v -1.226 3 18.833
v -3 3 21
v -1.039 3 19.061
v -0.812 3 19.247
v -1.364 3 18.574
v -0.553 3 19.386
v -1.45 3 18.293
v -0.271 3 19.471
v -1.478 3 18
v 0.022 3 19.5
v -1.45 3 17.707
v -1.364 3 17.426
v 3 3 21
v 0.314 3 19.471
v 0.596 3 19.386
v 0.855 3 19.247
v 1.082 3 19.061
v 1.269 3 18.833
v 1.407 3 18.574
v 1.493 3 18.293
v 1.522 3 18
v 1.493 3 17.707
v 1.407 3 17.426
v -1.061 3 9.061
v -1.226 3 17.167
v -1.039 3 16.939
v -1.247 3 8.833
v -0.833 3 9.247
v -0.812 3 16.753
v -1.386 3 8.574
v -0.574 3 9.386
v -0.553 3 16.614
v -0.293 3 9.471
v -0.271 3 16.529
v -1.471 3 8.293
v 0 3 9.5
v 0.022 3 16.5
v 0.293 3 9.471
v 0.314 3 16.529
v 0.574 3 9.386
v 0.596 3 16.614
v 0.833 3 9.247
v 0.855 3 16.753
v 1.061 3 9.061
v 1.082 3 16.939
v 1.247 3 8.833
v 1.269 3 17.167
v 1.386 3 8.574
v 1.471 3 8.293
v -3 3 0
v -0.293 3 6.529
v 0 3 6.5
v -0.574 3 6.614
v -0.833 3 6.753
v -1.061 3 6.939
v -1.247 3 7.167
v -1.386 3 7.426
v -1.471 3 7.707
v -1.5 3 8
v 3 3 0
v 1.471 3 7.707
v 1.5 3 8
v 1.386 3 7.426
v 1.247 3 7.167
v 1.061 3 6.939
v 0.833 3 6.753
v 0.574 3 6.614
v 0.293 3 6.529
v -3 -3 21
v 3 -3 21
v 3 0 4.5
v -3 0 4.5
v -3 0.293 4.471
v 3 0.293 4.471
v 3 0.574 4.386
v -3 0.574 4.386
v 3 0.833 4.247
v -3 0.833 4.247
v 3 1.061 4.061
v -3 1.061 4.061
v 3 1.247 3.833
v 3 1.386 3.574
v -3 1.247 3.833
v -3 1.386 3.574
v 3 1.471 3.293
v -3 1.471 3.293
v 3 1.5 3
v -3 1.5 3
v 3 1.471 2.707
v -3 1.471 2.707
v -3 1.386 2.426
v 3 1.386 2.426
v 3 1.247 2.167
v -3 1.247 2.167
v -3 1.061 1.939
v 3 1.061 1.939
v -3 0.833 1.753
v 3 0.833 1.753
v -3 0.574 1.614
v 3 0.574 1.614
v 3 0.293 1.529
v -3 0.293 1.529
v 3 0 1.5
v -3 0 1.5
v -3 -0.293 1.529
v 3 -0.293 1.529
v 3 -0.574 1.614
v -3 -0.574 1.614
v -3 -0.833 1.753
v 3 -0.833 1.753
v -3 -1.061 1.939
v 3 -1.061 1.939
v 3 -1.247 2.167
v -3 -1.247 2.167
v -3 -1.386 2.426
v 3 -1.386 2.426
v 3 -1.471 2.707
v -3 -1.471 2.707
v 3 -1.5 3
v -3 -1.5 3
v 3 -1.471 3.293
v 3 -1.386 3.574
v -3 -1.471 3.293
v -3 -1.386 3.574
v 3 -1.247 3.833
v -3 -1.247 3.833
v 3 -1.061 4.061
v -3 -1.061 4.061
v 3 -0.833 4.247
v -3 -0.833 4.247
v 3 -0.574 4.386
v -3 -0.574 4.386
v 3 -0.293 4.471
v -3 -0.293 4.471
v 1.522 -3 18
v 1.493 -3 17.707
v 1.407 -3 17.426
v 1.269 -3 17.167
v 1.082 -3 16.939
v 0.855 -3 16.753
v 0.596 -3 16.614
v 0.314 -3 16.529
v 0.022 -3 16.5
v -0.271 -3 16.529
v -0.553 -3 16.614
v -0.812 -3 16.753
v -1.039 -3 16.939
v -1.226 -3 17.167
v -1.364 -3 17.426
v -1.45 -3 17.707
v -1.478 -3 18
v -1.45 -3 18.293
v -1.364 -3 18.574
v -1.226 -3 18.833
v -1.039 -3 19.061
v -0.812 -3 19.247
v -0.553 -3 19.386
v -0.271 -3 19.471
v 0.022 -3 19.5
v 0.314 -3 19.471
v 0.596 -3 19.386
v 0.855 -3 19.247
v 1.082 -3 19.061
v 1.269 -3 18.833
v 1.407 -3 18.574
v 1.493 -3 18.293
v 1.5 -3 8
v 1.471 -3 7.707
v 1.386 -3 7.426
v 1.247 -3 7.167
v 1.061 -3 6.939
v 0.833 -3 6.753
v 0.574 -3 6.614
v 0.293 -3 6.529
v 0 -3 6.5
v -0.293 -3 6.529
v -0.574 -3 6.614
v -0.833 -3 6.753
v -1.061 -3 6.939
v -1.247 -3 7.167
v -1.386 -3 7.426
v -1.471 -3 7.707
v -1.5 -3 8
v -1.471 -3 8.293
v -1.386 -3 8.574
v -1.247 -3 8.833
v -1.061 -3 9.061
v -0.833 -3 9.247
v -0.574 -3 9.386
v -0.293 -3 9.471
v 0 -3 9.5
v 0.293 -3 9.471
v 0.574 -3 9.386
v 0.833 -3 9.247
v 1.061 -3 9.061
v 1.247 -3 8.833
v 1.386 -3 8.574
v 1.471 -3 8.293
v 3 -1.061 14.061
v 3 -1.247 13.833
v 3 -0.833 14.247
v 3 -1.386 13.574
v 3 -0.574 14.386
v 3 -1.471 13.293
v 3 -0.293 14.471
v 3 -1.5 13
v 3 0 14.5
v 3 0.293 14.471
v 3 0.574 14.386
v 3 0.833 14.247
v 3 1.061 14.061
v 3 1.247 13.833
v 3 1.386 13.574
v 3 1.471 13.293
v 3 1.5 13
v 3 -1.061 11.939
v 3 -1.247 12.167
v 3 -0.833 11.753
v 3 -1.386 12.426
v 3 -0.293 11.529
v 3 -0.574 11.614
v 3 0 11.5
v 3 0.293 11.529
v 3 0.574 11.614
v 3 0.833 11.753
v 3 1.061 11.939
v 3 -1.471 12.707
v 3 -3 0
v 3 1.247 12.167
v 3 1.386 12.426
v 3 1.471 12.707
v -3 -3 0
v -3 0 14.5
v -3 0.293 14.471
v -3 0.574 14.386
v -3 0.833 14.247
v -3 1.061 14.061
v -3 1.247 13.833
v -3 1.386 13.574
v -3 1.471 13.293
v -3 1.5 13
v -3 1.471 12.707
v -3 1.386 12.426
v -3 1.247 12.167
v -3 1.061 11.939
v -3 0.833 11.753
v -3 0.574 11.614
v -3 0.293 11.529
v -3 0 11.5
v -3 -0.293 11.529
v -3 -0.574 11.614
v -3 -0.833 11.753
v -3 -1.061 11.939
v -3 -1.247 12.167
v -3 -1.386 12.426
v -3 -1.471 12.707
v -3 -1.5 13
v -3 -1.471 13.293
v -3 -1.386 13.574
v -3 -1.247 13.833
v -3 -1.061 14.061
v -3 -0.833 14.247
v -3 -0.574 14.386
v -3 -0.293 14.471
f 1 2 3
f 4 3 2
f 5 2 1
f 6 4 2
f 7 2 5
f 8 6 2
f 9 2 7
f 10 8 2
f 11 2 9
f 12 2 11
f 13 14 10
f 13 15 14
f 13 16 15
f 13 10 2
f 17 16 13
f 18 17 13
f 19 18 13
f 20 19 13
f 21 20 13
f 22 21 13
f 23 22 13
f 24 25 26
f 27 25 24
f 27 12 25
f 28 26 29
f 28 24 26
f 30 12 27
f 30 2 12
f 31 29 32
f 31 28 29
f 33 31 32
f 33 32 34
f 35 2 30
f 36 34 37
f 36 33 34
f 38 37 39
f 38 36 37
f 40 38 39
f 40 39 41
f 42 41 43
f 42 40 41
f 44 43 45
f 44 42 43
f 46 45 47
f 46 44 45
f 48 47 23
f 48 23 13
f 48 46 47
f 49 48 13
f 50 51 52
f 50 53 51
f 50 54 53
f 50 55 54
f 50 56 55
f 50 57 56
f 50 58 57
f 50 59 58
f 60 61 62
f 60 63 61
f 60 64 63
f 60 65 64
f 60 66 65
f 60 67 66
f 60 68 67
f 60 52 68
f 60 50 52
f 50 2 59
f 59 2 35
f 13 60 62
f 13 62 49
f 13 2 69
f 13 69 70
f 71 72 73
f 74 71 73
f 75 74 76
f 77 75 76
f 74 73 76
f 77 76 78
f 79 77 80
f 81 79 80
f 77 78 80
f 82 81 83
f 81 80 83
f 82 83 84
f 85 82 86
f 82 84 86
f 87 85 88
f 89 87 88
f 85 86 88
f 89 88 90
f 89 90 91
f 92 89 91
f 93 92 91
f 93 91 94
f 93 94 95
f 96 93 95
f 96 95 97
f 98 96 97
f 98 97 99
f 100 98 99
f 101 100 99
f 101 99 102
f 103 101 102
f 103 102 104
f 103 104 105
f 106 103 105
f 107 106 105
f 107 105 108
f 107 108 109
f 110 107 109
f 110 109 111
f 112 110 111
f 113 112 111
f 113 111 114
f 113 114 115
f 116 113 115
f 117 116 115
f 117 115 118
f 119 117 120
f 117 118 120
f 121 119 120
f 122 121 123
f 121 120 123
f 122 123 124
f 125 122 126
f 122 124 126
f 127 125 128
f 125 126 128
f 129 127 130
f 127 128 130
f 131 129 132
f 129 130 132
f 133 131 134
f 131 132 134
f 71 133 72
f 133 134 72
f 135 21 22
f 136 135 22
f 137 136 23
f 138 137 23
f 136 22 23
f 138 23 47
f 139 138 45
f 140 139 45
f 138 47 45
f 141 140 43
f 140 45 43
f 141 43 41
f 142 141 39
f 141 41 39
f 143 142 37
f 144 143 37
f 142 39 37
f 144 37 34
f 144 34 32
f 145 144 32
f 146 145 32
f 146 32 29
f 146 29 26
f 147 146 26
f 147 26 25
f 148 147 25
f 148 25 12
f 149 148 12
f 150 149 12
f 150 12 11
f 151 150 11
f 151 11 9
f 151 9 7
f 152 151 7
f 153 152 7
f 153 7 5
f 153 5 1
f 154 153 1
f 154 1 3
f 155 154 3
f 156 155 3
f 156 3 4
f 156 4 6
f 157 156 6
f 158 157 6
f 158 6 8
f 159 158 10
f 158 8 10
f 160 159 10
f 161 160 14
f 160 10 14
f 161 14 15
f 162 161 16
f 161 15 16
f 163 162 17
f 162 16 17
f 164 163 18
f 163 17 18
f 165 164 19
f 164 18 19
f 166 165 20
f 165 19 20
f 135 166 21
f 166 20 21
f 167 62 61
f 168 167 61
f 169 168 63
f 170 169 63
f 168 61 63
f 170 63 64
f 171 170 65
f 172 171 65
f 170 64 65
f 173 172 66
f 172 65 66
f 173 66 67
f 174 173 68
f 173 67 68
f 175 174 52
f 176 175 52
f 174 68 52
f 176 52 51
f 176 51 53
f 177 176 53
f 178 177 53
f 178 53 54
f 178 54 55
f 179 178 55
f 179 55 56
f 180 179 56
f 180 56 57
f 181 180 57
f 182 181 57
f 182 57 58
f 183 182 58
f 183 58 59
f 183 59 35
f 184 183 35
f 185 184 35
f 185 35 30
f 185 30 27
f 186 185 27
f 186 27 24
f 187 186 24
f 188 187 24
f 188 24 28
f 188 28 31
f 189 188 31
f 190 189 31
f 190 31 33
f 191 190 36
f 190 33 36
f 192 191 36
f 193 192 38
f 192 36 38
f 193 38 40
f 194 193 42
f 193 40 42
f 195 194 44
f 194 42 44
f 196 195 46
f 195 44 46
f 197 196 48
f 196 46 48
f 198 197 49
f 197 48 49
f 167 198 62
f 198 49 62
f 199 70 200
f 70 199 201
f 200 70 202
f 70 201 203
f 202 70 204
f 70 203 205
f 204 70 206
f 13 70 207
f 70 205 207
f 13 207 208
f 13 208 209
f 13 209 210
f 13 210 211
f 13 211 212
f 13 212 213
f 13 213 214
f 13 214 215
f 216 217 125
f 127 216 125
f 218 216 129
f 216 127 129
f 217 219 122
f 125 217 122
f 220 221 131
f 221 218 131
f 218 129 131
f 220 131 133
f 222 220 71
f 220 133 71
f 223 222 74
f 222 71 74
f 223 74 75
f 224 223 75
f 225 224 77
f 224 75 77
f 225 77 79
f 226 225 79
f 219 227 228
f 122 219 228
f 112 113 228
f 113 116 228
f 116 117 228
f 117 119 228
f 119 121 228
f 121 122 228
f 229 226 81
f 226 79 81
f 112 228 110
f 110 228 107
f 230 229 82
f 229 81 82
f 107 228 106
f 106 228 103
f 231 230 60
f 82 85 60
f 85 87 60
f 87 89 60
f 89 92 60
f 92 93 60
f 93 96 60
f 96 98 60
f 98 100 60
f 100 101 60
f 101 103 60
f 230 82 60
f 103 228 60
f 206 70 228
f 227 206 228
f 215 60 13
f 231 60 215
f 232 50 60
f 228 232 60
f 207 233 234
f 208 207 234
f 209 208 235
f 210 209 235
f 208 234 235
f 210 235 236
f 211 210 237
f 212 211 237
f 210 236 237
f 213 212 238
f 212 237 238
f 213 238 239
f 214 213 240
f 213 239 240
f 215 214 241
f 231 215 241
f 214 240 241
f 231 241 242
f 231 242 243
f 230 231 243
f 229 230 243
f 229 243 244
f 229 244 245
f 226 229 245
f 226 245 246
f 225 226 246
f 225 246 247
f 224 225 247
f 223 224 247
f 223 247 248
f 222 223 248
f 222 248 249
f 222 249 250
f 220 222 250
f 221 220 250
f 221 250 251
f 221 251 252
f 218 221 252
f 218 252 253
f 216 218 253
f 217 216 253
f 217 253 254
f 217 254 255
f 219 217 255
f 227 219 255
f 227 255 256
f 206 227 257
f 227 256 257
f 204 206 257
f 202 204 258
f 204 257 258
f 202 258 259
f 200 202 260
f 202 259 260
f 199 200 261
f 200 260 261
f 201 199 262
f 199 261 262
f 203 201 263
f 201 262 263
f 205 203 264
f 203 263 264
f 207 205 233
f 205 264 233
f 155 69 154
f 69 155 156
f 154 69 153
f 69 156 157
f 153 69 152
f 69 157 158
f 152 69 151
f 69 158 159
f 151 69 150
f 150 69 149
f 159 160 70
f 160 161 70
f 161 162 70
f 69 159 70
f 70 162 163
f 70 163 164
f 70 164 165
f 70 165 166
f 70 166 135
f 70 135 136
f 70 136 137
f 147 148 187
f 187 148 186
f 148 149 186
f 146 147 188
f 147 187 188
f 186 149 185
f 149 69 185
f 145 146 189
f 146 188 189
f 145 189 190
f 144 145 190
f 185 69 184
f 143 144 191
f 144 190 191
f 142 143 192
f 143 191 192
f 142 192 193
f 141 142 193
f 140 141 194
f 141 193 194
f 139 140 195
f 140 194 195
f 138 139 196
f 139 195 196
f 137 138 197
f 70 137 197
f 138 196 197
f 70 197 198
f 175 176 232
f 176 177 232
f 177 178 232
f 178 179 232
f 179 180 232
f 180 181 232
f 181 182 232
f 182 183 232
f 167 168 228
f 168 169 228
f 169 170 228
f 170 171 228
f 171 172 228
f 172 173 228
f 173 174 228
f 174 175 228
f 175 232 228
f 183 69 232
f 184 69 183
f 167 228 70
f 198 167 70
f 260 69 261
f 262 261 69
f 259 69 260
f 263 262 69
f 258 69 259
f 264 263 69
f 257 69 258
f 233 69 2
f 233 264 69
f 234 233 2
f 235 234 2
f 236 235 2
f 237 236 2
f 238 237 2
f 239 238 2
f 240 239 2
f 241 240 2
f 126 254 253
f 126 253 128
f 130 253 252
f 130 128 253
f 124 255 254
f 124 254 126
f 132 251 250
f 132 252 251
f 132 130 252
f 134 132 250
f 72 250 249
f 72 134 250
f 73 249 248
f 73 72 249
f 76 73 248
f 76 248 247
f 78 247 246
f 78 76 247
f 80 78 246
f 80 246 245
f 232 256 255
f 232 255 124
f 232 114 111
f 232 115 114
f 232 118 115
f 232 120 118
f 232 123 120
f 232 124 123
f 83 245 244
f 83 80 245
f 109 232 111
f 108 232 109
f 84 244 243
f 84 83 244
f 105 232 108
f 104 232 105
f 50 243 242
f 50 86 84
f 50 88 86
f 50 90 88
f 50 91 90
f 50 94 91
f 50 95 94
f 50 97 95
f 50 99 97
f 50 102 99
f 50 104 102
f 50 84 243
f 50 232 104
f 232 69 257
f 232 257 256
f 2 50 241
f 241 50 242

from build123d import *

# Parameters (mm, degrees)
SKETCH_1_W          = 6
SKETCH_1_H          = 6
EXTRUDE_1_DEPTH     = 21
SKETCH_2_R          = 1.5
CUT_EXTRUDE_1_DEPTH = 21
SKETCH_3_R          = 1.5
CUT_EXTRUDE_2_DEPTH = 21


with BuildPart() as part:
    # 草图1 → 凸台-拉伸1 (new body)
    with BuildSketch(Plane.XY):
        Rectangle(SKETCH_1_W, SKETCH_1_H)
    extrude(amount=EXTRUDE_1_DEPTH)

    # 草图2 → 切除-拉伸1 (cut)
    with BuildSketch(Plane.ZY.offset(3)):
        with Locations((3, 0)):
            Circle(SKETCH_2_R)
        with Locations((13, 0)):
            Circle(SKETCH_2_R)
    extrude(amount=-CUT_EXTRUDE_1_DEPTH, mode=Mode.SUBTRACT)

    # 草图3 → 切除-拉伸2 (cut)
    with BuildSketch(Plane(origin=(0, 3, 0), x_dir=(1, 0, 0), z_dir=(0, 1, 0))):
        with Locations((0.02150406, -18)):
            Circle(SKETCH_3_R)
        with Locations((0, -8)):
            Circle(SKETCH_3_R)
    extrude(amount=-CUT_EXTRUDE_2_DEPTH, mode=Mode.SUBTRACT)


solid = part.part
